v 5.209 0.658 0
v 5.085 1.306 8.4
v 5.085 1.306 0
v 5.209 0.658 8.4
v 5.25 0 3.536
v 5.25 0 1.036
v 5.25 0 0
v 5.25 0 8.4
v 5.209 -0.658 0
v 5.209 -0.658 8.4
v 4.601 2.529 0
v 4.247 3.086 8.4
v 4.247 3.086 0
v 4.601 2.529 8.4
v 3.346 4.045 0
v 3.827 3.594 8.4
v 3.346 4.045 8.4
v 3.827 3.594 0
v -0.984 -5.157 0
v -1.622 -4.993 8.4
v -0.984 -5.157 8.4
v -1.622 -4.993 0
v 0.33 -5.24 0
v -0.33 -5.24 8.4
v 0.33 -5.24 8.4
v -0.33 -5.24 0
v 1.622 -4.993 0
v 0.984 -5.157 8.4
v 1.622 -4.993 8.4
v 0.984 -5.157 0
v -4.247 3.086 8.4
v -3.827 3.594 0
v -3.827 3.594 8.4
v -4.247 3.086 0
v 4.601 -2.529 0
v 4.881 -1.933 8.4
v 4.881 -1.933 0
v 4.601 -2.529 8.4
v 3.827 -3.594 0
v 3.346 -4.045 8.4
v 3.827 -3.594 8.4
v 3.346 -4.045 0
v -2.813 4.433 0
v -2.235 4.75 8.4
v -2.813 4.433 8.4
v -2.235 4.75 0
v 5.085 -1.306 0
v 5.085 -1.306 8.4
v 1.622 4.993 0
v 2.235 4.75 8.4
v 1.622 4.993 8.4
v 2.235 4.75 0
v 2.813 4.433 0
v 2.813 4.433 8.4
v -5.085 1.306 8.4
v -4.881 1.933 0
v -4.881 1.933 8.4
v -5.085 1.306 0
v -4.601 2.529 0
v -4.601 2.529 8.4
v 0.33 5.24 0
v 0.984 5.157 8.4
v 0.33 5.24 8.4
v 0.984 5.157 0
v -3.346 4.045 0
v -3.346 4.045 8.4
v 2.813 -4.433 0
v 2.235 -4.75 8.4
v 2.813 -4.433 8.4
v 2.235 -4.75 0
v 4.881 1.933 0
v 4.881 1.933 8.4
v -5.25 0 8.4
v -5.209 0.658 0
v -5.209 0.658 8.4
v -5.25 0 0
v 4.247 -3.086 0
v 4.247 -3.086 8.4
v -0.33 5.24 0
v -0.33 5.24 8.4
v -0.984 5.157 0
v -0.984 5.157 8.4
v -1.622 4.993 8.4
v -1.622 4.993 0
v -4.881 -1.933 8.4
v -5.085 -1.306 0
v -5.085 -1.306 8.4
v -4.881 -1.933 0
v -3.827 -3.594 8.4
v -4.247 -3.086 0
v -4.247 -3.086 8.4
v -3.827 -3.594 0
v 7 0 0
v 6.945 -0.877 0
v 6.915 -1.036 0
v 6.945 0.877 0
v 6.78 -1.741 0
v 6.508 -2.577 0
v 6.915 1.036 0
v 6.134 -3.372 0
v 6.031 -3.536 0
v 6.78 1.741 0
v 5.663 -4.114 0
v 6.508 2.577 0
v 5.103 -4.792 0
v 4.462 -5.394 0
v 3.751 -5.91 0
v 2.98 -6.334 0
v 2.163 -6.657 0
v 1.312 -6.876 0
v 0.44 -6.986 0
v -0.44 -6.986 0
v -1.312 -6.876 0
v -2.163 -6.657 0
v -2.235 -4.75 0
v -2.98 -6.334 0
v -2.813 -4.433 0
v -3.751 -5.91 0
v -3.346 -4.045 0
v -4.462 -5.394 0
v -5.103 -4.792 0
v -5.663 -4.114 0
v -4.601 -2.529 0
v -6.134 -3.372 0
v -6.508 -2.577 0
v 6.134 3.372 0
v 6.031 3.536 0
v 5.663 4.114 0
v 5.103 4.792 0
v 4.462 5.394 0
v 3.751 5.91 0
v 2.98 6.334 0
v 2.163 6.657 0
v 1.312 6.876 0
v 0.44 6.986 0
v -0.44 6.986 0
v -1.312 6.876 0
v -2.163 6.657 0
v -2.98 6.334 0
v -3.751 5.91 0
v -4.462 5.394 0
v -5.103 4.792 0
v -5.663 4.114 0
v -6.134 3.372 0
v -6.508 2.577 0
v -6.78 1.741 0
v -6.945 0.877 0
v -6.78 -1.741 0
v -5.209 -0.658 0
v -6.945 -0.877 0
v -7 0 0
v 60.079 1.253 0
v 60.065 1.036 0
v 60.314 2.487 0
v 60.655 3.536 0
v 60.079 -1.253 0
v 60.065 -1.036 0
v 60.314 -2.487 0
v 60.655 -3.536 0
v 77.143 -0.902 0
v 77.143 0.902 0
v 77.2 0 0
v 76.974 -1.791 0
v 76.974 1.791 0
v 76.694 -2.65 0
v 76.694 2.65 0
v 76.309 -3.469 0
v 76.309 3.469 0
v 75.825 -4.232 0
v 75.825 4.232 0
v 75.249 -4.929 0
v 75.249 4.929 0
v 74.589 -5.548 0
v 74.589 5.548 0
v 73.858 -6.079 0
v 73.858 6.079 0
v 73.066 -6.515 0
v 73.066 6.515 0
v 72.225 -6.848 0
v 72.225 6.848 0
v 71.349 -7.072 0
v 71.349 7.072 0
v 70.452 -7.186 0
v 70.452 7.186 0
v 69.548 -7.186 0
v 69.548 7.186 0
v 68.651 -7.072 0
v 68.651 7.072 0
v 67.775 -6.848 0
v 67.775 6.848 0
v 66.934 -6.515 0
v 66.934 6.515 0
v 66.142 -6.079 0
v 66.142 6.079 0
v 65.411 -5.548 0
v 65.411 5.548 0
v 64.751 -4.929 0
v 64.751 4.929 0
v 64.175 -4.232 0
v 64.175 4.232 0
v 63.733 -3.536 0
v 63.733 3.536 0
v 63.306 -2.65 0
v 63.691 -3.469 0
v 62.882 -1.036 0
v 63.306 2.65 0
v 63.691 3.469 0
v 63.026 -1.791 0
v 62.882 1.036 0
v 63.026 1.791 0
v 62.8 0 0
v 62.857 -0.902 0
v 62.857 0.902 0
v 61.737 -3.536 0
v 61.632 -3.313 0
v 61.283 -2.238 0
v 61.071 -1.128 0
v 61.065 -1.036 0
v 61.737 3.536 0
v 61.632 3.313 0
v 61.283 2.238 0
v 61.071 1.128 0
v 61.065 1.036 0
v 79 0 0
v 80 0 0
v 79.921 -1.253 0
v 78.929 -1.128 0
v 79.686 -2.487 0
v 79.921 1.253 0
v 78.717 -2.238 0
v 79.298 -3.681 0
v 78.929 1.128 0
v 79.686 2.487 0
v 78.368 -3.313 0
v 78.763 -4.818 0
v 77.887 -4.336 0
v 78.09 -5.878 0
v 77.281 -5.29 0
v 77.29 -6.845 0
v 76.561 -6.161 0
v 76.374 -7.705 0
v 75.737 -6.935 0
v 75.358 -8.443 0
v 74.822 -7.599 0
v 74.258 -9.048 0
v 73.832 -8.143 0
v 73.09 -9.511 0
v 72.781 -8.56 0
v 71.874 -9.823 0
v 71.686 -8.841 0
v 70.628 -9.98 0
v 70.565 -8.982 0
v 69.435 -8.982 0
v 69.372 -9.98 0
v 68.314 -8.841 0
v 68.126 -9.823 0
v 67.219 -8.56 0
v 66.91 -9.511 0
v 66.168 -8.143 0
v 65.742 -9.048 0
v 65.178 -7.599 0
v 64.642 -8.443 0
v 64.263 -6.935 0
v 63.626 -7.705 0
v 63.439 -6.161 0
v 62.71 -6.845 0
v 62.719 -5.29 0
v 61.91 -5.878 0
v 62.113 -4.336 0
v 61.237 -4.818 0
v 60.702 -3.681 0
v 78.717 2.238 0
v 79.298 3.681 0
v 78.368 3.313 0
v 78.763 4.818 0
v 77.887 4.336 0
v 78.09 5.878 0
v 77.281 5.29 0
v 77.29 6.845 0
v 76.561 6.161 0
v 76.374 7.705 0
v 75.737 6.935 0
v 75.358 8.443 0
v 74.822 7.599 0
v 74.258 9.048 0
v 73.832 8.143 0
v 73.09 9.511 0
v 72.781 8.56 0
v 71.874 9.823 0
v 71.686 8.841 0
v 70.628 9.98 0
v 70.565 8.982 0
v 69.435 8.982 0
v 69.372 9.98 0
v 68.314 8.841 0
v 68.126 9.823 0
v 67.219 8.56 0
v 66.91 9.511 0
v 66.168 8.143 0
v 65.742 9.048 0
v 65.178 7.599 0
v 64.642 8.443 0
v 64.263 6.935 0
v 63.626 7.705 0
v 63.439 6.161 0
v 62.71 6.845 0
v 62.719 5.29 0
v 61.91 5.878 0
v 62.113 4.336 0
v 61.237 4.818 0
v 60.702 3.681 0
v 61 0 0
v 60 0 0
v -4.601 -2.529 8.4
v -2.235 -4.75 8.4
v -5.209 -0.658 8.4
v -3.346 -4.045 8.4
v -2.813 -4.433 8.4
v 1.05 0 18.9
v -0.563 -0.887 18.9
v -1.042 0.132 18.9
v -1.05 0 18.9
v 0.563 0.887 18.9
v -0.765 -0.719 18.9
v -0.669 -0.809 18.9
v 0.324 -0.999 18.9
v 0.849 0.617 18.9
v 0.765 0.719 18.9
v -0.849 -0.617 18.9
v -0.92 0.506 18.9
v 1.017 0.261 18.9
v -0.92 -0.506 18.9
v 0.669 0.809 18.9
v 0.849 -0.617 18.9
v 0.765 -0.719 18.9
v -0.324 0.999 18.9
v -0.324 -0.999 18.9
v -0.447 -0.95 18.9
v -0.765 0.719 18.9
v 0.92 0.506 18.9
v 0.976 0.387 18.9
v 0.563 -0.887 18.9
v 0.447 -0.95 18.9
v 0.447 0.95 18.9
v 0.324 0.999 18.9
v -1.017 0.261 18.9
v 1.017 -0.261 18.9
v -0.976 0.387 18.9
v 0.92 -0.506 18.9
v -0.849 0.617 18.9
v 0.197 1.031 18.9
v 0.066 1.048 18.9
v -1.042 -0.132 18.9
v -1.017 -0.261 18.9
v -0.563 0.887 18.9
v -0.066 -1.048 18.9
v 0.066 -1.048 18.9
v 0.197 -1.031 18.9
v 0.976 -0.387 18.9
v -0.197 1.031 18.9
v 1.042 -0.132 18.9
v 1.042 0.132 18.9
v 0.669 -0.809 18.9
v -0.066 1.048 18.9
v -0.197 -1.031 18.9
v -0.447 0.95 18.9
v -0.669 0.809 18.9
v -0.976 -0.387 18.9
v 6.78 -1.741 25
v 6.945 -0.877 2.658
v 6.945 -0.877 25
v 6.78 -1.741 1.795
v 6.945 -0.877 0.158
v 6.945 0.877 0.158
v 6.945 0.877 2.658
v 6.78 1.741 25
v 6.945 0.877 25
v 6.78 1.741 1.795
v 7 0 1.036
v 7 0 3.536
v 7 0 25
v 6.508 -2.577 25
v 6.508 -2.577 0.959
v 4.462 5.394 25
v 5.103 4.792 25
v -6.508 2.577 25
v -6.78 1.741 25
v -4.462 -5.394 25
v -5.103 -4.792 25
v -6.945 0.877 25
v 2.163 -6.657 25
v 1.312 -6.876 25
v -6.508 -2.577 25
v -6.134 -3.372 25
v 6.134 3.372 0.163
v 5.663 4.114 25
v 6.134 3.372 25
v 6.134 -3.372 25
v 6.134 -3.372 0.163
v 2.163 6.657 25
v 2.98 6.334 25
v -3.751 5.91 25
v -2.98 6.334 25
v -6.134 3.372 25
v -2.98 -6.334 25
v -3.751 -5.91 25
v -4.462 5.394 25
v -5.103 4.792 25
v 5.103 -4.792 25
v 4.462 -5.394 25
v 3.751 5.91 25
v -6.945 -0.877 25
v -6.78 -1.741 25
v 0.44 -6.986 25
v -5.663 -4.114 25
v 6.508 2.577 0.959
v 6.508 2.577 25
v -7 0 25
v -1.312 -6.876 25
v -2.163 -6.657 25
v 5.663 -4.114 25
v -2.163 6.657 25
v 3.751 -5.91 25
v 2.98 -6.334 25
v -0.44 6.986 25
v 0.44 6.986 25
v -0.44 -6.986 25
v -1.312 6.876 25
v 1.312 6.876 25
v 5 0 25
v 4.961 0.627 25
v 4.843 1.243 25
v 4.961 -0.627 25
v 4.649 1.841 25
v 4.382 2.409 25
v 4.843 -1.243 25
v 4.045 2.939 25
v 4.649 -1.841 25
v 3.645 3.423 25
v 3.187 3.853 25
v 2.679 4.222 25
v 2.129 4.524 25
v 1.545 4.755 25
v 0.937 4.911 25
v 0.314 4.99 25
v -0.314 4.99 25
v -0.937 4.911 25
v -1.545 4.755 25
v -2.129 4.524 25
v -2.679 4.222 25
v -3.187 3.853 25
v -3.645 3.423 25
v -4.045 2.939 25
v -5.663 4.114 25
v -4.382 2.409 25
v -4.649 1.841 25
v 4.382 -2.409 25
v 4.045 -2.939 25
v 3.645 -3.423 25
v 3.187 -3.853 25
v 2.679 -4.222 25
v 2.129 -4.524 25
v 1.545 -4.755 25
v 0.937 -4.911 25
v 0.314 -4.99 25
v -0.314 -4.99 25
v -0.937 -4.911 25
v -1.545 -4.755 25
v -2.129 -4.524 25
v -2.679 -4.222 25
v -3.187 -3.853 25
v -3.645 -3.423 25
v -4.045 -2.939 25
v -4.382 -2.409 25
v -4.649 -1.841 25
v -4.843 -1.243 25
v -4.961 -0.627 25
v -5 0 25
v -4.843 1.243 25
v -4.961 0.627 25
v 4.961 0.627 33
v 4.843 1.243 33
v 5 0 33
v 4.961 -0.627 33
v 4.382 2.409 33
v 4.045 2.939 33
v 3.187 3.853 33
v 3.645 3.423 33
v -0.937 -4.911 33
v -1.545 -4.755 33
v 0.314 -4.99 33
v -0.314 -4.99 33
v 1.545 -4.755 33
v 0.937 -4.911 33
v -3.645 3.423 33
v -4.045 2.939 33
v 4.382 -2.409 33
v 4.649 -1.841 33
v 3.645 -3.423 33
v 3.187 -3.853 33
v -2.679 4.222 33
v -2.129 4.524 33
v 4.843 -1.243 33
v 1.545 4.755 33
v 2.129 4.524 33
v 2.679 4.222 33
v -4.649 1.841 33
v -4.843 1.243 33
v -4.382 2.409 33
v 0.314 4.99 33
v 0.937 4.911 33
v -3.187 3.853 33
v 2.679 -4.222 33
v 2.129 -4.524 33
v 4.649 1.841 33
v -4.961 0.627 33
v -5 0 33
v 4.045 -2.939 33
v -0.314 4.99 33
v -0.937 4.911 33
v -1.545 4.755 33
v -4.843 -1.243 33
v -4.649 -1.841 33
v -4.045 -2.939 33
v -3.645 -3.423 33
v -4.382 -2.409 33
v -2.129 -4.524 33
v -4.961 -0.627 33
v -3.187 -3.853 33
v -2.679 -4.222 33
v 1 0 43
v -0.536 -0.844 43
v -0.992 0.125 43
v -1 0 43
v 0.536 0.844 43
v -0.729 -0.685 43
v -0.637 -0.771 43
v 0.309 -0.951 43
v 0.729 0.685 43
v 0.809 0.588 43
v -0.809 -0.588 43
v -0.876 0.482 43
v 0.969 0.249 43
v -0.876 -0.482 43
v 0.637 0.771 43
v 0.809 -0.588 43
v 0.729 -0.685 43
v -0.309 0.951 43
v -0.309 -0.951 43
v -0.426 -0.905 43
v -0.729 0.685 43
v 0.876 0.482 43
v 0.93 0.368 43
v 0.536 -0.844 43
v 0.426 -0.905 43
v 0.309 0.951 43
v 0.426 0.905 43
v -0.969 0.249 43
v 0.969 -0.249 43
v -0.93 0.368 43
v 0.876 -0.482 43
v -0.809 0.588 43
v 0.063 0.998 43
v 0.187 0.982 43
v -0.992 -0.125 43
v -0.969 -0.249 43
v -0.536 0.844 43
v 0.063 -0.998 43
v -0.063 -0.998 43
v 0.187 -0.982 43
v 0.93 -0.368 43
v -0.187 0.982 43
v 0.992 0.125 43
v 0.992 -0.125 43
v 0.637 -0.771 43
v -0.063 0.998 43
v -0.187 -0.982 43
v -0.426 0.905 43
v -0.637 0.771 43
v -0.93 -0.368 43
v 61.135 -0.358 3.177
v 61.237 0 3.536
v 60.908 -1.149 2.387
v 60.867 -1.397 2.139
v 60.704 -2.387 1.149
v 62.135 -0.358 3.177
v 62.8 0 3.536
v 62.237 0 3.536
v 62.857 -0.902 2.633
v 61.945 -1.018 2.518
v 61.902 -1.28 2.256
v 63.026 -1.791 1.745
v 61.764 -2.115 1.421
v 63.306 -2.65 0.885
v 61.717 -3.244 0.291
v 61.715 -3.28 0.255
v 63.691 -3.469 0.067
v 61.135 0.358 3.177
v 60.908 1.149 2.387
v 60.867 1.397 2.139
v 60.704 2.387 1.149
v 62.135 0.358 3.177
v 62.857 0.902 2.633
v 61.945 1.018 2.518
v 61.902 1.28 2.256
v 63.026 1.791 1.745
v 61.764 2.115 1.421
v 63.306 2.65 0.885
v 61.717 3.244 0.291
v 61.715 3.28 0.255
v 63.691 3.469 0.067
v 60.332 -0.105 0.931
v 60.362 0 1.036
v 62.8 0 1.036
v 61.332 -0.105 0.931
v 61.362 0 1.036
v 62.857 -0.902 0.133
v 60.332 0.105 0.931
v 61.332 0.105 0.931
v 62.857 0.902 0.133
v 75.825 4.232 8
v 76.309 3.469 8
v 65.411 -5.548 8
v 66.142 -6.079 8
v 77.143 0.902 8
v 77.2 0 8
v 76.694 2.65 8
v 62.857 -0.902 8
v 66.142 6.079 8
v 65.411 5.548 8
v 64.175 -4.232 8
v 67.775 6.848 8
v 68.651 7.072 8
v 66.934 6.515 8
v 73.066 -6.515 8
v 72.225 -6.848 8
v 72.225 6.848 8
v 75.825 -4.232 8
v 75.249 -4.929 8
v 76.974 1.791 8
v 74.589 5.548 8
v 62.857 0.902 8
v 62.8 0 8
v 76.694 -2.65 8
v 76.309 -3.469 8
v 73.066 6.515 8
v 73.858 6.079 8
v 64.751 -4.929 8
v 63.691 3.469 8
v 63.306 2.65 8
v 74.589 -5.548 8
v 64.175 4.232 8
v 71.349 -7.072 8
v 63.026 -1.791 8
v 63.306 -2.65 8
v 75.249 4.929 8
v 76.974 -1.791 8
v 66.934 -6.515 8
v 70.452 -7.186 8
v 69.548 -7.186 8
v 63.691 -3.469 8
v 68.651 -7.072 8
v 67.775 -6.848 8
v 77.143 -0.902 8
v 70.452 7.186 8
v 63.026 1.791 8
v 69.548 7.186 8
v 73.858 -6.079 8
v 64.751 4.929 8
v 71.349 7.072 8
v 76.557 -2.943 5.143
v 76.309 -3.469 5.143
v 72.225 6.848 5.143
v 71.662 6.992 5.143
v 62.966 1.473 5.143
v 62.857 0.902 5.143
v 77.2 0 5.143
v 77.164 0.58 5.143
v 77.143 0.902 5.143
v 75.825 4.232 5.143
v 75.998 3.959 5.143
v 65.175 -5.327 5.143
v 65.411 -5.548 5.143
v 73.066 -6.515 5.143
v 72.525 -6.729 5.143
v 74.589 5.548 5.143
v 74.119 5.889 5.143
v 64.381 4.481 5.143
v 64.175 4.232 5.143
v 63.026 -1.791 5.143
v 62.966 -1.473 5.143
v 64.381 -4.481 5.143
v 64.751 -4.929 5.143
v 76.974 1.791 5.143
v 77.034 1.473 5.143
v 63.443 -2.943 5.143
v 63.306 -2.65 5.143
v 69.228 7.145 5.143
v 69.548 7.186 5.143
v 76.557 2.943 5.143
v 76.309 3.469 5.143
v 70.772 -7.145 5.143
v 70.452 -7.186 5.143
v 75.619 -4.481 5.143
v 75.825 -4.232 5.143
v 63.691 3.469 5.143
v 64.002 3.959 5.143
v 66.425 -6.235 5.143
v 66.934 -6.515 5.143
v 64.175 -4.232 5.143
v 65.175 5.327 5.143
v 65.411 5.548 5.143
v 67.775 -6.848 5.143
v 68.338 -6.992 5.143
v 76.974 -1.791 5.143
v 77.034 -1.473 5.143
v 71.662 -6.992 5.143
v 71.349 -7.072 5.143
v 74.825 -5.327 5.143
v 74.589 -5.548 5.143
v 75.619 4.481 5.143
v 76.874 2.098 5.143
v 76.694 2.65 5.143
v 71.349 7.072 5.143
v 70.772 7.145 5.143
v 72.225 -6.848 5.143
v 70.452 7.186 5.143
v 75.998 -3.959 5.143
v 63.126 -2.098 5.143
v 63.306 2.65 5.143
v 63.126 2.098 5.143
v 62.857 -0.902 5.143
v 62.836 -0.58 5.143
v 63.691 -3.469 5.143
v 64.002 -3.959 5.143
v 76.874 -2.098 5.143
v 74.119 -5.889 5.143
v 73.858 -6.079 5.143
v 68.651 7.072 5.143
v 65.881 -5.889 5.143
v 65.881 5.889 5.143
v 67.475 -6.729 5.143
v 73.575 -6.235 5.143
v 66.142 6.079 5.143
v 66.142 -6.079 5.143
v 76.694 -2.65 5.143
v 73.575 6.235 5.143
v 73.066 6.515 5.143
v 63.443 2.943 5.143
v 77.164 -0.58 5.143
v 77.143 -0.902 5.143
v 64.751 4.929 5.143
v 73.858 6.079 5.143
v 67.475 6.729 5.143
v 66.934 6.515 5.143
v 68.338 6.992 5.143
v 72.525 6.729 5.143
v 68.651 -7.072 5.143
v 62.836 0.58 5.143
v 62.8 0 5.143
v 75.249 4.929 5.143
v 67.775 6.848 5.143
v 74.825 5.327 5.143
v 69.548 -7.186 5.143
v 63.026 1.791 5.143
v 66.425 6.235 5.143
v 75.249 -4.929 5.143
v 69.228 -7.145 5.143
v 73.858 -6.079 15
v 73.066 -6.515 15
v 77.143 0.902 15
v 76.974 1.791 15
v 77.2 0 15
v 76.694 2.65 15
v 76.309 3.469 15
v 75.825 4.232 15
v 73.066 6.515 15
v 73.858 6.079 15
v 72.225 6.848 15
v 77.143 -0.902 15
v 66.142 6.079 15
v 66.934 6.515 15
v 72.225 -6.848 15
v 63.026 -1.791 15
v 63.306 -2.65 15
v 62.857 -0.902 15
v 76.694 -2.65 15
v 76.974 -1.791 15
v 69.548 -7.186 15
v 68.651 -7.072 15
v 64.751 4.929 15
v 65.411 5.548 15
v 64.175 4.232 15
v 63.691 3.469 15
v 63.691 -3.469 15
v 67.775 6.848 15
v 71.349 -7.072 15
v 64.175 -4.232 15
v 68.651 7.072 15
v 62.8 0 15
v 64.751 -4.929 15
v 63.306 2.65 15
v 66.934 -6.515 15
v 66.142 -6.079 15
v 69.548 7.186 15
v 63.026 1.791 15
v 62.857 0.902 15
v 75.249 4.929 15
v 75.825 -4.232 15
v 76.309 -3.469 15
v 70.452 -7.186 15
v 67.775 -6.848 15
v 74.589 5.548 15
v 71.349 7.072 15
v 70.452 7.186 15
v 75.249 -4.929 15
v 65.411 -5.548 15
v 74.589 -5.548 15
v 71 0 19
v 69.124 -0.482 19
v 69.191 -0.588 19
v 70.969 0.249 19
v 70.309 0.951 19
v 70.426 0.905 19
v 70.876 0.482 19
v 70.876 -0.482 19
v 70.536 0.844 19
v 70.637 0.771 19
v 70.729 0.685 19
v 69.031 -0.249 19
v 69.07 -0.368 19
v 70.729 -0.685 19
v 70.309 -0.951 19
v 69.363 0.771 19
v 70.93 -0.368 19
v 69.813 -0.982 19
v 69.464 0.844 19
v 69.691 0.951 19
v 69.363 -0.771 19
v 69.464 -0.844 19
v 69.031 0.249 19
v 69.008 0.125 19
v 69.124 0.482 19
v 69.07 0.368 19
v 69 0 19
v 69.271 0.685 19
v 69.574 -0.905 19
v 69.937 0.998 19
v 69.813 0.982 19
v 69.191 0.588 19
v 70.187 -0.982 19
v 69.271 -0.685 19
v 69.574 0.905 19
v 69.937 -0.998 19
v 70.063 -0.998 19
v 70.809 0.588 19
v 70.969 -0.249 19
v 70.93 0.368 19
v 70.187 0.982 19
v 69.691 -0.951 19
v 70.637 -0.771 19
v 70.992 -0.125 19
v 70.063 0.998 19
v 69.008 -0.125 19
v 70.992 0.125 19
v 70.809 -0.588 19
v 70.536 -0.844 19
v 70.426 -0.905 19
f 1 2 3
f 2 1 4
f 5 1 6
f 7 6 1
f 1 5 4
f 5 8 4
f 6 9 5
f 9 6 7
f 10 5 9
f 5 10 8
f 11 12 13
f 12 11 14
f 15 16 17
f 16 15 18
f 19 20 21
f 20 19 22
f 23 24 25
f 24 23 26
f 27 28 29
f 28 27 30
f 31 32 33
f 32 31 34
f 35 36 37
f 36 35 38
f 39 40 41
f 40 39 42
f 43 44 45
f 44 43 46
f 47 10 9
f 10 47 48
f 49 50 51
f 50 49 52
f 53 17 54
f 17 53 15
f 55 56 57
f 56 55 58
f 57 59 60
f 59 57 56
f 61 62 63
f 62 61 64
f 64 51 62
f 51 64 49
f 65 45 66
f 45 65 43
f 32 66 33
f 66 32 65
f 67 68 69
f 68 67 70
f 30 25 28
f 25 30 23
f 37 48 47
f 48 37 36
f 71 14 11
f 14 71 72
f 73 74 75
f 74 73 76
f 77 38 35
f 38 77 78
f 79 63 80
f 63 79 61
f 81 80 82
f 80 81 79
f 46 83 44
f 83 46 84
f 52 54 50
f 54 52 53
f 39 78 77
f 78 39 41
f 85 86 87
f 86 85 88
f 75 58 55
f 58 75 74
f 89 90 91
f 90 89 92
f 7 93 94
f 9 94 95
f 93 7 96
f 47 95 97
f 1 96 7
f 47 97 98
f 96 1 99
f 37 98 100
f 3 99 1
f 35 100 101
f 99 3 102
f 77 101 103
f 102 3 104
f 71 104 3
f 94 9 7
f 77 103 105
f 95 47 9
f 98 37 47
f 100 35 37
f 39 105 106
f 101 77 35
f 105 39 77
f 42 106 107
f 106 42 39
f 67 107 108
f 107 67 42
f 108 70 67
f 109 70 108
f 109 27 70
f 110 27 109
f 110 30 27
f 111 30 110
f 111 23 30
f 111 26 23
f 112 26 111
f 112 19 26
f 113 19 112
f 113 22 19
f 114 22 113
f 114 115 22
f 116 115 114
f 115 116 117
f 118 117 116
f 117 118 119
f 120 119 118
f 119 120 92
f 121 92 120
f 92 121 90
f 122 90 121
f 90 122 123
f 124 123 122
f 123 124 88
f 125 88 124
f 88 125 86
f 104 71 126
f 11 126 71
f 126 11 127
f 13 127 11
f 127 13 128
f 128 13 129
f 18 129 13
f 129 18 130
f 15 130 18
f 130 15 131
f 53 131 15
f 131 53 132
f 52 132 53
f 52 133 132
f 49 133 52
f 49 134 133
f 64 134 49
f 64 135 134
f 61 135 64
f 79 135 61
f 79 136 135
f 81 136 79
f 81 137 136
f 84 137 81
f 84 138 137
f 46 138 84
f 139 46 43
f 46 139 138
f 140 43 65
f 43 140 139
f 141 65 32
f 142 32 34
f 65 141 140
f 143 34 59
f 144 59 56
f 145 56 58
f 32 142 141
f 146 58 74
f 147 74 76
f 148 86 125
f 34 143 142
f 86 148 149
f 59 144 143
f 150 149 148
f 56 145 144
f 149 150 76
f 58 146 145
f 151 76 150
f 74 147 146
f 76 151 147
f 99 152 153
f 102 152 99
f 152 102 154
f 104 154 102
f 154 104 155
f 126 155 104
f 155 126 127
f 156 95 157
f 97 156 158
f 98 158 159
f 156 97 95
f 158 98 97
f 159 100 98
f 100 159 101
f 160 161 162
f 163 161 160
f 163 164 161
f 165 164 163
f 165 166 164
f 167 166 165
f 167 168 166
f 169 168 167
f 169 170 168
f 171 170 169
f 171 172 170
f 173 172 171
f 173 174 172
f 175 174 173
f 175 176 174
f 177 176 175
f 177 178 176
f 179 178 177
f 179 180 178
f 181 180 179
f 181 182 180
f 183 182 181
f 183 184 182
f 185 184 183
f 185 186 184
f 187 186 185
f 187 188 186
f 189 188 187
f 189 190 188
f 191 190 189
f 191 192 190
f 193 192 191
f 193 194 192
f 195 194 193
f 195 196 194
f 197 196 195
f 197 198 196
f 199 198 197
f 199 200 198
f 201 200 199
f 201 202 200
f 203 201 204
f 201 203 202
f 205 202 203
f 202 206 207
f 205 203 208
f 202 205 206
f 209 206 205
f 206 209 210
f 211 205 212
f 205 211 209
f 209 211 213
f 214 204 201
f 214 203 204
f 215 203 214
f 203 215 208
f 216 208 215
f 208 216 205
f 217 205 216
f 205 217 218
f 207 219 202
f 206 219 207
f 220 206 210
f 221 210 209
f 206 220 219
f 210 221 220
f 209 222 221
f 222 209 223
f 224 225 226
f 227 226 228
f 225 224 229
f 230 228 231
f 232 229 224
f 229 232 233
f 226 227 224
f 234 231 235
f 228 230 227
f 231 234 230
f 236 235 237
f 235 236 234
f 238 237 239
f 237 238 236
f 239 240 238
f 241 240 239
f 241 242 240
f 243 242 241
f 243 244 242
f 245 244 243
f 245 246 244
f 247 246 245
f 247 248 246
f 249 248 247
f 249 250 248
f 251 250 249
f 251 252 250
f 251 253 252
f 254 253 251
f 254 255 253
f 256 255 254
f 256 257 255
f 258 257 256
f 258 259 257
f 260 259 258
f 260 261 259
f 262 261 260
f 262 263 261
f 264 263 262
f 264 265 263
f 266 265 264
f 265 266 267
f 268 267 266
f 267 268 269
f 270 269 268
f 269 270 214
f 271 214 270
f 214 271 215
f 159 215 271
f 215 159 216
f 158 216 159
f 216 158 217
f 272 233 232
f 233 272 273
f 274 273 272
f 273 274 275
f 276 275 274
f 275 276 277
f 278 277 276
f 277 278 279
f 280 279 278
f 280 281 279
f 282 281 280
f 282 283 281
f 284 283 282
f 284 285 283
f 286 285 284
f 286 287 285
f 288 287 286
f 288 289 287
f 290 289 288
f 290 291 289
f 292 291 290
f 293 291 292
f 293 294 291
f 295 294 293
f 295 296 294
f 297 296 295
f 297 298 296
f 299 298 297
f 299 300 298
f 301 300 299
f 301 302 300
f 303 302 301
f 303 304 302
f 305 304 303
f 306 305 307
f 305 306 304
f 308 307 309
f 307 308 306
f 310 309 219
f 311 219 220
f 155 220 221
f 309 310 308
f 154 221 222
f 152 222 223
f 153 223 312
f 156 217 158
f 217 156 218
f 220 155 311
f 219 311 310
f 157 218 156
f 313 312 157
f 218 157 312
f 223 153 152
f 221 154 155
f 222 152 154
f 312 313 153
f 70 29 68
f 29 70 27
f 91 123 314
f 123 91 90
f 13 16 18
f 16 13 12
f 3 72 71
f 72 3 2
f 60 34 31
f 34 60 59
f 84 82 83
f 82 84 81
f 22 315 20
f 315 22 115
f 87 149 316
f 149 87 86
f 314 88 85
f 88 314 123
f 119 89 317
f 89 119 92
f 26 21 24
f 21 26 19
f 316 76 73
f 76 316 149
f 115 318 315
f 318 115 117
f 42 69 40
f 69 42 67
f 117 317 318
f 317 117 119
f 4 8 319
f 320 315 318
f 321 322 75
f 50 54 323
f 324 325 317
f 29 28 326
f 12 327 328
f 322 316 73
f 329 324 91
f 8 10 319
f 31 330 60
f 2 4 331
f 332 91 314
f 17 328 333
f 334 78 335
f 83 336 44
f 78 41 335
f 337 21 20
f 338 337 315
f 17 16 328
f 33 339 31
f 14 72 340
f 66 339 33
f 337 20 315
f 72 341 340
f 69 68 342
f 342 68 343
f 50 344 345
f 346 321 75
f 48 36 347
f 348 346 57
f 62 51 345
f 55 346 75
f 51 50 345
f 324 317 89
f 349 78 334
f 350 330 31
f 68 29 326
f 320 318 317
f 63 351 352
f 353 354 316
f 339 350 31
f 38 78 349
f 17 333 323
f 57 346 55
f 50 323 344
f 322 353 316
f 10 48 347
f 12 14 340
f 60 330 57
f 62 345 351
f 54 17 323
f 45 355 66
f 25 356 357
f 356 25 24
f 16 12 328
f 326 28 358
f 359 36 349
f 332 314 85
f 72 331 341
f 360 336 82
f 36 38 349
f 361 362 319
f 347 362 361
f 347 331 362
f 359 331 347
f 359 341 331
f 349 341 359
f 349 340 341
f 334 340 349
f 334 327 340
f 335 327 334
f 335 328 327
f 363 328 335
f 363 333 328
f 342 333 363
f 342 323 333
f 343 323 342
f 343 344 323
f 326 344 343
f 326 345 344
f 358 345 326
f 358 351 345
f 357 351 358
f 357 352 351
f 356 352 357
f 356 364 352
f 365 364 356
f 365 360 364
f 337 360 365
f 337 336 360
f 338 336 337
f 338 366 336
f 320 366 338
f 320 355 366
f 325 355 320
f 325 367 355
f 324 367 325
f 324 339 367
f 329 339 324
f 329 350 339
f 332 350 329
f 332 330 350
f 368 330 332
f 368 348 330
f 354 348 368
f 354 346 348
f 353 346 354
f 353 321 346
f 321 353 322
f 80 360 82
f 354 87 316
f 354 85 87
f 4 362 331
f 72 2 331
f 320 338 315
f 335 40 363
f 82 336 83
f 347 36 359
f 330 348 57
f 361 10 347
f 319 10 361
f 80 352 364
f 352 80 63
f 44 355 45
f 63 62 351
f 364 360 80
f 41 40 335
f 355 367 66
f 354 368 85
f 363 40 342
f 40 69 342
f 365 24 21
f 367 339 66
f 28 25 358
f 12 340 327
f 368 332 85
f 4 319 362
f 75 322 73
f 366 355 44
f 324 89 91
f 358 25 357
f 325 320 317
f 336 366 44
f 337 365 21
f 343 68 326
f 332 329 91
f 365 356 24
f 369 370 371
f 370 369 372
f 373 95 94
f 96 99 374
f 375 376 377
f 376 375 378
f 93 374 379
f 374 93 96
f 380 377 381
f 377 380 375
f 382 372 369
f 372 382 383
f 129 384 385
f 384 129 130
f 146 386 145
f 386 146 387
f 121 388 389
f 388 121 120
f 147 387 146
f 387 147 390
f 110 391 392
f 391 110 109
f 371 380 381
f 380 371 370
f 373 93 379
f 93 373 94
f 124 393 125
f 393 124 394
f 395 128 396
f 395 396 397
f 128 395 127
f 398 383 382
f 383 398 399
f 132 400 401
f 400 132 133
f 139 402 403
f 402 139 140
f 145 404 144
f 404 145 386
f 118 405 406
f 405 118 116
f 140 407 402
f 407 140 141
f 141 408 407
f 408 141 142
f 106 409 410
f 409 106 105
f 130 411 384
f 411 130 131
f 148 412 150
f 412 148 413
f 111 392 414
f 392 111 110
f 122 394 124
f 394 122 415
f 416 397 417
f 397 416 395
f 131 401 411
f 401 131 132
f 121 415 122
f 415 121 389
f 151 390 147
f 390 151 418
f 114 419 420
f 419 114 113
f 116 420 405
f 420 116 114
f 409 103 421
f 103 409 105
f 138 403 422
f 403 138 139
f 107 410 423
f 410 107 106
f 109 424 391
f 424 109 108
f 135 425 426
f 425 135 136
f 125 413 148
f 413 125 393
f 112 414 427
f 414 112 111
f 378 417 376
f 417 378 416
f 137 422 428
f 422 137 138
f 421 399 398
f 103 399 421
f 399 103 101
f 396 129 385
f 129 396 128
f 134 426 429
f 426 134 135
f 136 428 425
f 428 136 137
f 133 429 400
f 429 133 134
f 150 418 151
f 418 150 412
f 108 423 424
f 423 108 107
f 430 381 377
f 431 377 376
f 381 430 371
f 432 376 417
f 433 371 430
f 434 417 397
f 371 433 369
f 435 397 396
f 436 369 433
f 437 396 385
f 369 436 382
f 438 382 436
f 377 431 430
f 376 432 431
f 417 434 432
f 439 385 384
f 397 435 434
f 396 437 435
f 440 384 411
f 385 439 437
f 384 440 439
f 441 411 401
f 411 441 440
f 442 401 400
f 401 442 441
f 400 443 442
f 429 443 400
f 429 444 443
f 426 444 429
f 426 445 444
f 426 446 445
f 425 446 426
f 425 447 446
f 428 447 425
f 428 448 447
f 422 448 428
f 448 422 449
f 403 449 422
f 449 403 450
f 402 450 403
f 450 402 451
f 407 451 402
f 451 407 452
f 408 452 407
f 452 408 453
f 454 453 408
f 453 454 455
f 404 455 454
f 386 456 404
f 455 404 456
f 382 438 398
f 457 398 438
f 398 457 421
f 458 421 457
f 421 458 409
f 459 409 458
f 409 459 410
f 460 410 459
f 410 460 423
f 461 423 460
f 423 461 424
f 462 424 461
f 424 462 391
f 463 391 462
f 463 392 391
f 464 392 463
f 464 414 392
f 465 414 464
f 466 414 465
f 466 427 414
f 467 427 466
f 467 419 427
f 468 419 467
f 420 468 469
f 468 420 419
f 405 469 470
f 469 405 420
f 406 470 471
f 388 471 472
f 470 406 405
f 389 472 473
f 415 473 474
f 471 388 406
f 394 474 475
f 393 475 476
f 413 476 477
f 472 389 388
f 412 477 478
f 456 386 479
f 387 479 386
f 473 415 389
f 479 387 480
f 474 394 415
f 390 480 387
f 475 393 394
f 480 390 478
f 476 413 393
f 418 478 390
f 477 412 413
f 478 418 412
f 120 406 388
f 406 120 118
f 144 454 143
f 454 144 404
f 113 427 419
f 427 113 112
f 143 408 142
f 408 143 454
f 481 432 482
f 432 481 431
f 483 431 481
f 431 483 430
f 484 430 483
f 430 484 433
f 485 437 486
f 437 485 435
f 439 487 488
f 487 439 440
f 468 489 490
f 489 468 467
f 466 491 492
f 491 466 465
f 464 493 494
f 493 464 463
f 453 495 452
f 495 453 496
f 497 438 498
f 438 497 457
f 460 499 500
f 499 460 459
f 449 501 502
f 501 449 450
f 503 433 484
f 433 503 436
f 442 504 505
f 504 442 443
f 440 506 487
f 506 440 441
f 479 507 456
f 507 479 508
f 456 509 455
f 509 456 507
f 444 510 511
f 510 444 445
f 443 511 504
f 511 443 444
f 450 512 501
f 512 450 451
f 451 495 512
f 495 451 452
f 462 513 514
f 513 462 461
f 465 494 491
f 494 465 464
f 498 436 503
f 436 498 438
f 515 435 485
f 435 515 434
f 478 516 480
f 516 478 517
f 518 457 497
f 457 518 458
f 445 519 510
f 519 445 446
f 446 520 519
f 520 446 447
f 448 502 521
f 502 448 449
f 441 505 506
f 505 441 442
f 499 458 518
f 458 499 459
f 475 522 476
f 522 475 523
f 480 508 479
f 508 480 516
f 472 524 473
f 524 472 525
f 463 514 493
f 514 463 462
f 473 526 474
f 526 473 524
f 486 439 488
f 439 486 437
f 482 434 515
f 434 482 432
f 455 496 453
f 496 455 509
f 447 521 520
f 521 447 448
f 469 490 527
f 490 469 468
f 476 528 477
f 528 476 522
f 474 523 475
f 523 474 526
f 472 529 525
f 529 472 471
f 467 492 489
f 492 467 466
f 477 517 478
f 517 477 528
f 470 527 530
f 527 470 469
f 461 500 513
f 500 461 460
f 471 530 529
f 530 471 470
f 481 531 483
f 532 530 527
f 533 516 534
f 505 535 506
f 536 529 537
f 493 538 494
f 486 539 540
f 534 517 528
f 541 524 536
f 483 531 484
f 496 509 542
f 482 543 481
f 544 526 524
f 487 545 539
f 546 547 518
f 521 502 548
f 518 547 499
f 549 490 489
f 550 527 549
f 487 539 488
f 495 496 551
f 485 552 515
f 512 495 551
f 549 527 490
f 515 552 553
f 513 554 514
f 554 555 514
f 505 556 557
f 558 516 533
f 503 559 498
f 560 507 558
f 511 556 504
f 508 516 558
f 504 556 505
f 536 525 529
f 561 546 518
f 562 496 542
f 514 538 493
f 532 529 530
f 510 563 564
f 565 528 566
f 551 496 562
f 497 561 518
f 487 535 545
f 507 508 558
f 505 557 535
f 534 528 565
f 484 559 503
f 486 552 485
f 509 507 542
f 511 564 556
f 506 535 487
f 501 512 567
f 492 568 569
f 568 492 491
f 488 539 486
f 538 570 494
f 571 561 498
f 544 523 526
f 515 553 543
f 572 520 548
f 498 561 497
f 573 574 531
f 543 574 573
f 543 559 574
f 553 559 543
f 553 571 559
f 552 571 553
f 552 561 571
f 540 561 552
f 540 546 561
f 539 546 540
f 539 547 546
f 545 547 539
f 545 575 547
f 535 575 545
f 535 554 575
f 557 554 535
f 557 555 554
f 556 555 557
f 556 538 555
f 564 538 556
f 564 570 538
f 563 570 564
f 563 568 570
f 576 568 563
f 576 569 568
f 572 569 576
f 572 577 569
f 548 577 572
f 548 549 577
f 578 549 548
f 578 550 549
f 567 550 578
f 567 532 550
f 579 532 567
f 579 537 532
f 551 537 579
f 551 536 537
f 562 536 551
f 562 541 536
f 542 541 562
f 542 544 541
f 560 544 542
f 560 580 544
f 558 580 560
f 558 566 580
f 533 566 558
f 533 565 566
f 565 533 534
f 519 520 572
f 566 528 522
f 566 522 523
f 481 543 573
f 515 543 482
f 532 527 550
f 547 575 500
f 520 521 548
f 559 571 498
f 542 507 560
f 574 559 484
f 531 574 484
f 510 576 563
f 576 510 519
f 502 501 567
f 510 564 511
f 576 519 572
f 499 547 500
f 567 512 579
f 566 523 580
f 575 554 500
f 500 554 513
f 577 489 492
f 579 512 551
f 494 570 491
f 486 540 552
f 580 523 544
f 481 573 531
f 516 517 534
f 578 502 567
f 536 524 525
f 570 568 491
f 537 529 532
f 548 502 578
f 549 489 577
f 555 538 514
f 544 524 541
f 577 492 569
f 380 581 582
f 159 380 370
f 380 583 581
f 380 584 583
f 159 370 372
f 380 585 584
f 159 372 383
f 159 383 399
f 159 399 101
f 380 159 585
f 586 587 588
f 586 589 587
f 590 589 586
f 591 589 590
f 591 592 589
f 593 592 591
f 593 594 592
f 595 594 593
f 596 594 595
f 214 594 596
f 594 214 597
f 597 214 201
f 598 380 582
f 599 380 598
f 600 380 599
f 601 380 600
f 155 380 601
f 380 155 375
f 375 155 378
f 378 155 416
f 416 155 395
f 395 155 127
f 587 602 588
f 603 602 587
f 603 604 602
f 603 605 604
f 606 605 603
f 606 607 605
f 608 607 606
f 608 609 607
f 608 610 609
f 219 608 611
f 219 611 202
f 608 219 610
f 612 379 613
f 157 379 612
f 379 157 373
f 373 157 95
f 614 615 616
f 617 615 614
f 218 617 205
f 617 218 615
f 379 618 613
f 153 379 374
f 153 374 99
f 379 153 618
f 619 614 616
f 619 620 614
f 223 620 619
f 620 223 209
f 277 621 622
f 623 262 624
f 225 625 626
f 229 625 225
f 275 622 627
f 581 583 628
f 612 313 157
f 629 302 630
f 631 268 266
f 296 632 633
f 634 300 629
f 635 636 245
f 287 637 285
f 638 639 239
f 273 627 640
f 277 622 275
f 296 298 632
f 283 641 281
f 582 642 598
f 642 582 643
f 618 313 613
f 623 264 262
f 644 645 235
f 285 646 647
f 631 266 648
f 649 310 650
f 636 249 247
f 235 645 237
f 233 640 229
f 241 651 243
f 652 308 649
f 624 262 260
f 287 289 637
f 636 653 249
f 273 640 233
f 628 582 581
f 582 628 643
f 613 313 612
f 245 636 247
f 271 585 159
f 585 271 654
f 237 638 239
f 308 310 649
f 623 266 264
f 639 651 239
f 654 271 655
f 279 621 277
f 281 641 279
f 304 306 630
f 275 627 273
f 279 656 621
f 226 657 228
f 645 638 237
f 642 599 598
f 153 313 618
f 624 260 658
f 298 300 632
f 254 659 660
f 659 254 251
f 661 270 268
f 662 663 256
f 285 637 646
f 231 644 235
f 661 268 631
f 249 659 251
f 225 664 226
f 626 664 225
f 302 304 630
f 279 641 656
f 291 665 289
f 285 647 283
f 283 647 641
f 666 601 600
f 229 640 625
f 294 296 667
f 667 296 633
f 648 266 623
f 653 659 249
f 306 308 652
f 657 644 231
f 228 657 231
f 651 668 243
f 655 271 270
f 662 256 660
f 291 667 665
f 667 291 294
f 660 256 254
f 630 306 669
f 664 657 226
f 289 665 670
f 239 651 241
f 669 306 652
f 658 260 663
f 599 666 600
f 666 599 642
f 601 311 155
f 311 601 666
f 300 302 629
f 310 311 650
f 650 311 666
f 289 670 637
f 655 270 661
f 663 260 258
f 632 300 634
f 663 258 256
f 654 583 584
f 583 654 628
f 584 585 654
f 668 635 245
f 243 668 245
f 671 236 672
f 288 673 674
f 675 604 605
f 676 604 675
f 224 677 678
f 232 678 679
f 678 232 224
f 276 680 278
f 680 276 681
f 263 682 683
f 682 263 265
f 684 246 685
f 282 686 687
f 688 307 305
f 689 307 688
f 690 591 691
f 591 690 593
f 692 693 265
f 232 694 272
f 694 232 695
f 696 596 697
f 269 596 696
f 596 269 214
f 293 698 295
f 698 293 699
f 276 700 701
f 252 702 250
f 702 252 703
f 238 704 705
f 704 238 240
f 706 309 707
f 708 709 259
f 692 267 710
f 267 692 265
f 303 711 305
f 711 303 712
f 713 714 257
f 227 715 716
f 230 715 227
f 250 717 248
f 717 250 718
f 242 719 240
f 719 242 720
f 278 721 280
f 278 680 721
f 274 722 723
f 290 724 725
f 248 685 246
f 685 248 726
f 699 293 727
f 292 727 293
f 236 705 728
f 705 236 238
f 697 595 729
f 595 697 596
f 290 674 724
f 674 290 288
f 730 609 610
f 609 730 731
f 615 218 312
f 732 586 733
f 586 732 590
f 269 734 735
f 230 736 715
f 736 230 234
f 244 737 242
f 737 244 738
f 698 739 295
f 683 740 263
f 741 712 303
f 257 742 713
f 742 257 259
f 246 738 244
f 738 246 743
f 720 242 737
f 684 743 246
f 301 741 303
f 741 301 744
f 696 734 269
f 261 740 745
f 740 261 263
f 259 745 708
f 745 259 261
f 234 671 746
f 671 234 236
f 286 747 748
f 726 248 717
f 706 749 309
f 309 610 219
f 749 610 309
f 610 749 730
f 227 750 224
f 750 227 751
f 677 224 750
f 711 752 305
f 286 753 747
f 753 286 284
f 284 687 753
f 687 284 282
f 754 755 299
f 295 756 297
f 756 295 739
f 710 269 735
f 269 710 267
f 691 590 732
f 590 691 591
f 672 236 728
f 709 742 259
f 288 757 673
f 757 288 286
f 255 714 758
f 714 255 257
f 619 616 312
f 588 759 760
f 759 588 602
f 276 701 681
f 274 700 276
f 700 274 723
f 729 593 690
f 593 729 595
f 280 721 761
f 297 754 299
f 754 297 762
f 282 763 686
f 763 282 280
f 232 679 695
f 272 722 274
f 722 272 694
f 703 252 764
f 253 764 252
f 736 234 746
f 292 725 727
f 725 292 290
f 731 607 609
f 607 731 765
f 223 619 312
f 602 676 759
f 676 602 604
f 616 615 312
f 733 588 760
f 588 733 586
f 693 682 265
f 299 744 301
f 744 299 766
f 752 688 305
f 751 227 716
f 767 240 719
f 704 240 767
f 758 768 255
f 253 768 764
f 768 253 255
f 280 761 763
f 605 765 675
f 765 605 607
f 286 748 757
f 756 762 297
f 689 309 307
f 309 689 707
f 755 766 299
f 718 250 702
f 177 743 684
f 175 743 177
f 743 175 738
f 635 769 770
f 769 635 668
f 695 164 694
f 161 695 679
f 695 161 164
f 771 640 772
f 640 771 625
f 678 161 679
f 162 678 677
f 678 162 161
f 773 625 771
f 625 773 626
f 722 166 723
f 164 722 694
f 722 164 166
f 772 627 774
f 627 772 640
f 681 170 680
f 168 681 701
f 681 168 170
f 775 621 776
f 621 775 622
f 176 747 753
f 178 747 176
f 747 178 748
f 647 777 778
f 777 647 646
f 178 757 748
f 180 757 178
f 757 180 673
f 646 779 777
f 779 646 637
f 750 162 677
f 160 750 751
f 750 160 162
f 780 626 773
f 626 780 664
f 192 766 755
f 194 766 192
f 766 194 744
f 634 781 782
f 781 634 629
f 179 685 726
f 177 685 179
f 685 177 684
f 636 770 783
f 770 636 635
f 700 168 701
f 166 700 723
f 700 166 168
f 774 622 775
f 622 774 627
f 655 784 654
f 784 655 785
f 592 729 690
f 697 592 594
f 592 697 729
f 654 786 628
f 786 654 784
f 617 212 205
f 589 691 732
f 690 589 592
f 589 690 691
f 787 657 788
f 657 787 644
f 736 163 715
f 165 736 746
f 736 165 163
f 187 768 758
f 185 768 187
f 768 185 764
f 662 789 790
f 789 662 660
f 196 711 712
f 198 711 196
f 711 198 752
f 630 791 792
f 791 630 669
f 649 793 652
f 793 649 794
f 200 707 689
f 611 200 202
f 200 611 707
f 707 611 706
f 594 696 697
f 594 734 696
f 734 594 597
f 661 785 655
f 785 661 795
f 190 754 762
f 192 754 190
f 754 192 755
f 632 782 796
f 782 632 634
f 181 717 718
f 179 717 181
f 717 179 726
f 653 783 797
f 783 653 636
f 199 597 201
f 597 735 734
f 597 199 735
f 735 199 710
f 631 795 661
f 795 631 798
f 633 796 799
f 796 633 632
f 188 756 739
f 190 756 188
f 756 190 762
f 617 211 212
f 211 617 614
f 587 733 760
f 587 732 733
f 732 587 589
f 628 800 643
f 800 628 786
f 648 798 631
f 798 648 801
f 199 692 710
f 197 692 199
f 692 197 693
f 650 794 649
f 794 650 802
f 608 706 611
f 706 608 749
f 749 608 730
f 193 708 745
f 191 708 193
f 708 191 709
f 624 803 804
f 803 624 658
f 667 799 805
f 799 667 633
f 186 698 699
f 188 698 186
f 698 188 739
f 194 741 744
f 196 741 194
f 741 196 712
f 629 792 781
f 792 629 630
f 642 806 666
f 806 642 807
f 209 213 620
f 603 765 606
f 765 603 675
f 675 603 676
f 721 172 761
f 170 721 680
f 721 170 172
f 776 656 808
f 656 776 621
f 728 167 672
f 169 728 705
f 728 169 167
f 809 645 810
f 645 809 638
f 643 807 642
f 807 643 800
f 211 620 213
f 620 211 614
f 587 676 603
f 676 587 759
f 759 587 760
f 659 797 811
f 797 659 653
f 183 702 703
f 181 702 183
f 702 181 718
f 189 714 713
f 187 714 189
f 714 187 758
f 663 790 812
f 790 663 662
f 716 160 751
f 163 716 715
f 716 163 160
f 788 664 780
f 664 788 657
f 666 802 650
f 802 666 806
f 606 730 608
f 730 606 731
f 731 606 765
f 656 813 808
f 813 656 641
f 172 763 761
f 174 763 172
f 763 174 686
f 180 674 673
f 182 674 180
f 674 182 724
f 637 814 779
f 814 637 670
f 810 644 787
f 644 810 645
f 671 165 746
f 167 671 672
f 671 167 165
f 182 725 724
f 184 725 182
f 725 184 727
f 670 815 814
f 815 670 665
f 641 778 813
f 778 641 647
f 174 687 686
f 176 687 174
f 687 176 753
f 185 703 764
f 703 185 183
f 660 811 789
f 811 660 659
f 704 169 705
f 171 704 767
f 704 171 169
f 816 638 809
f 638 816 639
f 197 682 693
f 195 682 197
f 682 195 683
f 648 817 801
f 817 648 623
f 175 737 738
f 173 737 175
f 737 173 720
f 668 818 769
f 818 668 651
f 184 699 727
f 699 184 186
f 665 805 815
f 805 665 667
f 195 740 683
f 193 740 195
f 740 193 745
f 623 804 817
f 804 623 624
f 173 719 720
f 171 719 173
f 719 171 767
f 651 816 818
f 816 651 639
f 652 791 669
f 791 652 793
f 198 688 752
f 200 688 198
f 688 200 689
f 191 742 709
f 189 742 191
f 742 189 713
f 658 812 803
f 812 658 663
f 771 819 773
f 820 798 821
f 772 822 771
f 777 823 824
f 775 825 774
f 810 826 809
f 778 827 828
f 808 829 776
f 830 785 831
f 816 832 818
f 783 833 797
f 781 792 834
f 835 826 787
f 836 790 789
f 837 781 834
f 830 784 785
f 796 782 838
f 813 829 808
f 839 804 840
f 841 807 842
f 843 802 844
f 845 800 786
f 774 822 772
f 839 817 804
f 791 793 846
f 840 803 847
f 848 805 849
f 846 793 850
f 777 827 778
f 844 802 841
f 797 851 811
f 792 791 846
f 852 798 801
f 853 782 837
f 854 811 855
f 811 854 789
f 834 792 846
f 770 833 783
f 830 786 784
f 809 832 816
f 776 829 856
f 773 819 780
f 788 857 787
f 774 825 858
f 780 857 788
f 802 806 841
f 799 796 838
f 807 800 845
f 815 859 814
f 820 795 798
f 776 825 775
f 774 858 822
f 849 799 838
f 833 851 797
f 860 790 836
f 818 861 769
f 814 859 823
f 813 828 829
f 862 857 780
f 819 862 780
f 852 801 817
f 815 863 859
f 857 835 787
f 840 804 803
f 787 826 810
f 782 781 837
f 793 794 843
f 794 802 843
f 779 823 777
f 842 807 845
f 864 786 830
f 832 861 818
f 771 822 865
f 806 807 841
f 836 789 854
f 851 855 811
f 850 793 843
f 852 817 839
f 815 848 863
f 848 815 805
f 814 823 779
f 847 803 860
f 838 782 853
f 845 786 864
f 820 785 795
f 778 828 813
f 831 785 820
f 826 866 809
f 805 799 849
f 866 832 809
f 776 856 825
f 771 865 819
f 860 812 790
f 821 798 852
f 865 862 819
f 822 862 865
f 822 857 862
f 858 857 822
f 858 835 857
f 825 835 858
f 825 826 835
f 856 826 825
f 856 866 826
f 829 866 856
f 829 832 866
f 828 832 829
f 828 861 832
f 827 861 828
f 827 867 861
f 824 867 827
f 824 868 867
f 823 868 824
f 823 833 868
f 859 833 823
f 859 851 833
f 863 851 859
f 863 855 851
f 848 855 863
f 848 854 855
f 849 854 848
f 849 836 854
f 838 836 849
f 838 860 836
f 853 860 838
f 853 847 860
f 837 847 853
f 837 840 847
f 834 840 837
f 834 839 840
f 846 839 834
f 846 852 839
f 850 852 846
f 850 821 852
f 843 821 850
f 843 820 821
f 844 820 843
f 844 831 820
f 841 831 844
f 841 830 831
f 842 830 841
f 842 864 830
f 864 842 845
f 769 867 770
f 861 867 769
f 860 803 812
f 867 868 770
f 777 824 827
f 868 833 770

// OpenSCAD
// [FL_INDEX: keywords="openscad, 3d_parametric, Stackable_CD_stand_-_Fully_customizable, csg_solid" | COT="Parametric OpenSCAD design from 3DCodeverse"]
// Title: Stackable CD stand - Fully customizable

/* [General] */
partToMake = 0; //[0:CD Holder, 1:Foot]
tolerance = 1.05;
resolution = 50; //[4:100]

/* [Stackable] */
baseHeight = 25; //[10:100]
baseWidth = 7; //[3:20]

topHeight = 8; //[2:20]
topWidth = 5; //[2:20]
topConeHeight = 10; //[0:20]

/* [Foot] */
feetNum = 5; //[3:10]
feetWidth = 3; //[1:10]
feetLength = 22; //[5:50]
footHeight = 5; //[1:10]
footWidth = 11; //[0:40]

/* [Shaft] */
shaftLength = 70; //[30:200]
shaftWidth = 5; //[2:20]

/* [CD holder] */
cdPoleRadius = 7.2;
cdPoleHeight = 15; //[5:50]
cdPoleHatHeight = 4; //[0:10]
cdBaseWidth = 10; //[0:30]
cdBaseHeight = 8; //[0:50]

/* [Hidden] */
$fn = resolution;

module top()
{
	//Create top cylinder
	
	cylinder(h=topHeight, r=topWidth);
	
	//Create a cone at the very top
	translate([0, 0, topHeight])
		cylinder(topConeHeight, topWidth);
}

module stackable()
{
	difference()
	{
		cylinder(h=baseHeight, r=baseWidth); //Base-cylinder

		scale(tolerance, tolerance, tolerance) //Scale the top-hole using tolerance
			top(); //Cut a top-shaped hole in the base
	}

	translate([0, 0, baseHeight]) top(); //Add the top, on top of the base
}

module foot()
{
	stackable();
	
	for(i = [0:feetNum])
	{
		rotate(i*(360/feetNum), [0, 0, 1])
		{
			translate([feetLength/2+topWidth, 0, feetWidth/2])
				cube([feetLength, feetWidth, feetWidth], center = true);
			
			translate([feetLength+topWidth, 0, 0])
				cylinder(footHeight, footWidth);
		}
	}
}

module shaft()
{
	difference()
	{
		translate([0, 0, -shaftWidth/2])
			rotate(45, [1, 0, 0])
				cube([shaftLength, shaftWidth, shaftWidth], center = true);
				
		translate([0, 0, -shaftWidth])
			rotate(45, [1, 0, 0])
				cube([shaftLength, shaftWidth, shaftWidth], center = true);
		
		translate([0, 0, -shaftWidth])
			cube([shaftLength, shaftWidth*2, shaftWidth], center = true);
	}
	
}

module cdPole()
{	
	difference()
	{
		cylinder(cdBaseHeight, cdBaseWidth, cdPoleRadius); //CD base cone
		scale(0.9, 0.9, 0.9) cylinder(cdBaseHeight, cdBaseWidth, cdPoleRadius); //CD base cone
	}
	
	cylinder(h=cdPoleHeight, r=cdPoleRadius); //CD pole
	
	translate([0, 0, cdPoleHeight])
		cylinder(cdPoleHatHeight, cdPoleRadius); //CD top cone
}


if( partToMake == 1 )
{
	foot();
}
else
{
	stackable();
	translate([shaftLength/2+topWidth*tolerance, 0, shaftWidth/2]) shaft();
	translate([shaftLength, 0, 0]) cdPole();
}
